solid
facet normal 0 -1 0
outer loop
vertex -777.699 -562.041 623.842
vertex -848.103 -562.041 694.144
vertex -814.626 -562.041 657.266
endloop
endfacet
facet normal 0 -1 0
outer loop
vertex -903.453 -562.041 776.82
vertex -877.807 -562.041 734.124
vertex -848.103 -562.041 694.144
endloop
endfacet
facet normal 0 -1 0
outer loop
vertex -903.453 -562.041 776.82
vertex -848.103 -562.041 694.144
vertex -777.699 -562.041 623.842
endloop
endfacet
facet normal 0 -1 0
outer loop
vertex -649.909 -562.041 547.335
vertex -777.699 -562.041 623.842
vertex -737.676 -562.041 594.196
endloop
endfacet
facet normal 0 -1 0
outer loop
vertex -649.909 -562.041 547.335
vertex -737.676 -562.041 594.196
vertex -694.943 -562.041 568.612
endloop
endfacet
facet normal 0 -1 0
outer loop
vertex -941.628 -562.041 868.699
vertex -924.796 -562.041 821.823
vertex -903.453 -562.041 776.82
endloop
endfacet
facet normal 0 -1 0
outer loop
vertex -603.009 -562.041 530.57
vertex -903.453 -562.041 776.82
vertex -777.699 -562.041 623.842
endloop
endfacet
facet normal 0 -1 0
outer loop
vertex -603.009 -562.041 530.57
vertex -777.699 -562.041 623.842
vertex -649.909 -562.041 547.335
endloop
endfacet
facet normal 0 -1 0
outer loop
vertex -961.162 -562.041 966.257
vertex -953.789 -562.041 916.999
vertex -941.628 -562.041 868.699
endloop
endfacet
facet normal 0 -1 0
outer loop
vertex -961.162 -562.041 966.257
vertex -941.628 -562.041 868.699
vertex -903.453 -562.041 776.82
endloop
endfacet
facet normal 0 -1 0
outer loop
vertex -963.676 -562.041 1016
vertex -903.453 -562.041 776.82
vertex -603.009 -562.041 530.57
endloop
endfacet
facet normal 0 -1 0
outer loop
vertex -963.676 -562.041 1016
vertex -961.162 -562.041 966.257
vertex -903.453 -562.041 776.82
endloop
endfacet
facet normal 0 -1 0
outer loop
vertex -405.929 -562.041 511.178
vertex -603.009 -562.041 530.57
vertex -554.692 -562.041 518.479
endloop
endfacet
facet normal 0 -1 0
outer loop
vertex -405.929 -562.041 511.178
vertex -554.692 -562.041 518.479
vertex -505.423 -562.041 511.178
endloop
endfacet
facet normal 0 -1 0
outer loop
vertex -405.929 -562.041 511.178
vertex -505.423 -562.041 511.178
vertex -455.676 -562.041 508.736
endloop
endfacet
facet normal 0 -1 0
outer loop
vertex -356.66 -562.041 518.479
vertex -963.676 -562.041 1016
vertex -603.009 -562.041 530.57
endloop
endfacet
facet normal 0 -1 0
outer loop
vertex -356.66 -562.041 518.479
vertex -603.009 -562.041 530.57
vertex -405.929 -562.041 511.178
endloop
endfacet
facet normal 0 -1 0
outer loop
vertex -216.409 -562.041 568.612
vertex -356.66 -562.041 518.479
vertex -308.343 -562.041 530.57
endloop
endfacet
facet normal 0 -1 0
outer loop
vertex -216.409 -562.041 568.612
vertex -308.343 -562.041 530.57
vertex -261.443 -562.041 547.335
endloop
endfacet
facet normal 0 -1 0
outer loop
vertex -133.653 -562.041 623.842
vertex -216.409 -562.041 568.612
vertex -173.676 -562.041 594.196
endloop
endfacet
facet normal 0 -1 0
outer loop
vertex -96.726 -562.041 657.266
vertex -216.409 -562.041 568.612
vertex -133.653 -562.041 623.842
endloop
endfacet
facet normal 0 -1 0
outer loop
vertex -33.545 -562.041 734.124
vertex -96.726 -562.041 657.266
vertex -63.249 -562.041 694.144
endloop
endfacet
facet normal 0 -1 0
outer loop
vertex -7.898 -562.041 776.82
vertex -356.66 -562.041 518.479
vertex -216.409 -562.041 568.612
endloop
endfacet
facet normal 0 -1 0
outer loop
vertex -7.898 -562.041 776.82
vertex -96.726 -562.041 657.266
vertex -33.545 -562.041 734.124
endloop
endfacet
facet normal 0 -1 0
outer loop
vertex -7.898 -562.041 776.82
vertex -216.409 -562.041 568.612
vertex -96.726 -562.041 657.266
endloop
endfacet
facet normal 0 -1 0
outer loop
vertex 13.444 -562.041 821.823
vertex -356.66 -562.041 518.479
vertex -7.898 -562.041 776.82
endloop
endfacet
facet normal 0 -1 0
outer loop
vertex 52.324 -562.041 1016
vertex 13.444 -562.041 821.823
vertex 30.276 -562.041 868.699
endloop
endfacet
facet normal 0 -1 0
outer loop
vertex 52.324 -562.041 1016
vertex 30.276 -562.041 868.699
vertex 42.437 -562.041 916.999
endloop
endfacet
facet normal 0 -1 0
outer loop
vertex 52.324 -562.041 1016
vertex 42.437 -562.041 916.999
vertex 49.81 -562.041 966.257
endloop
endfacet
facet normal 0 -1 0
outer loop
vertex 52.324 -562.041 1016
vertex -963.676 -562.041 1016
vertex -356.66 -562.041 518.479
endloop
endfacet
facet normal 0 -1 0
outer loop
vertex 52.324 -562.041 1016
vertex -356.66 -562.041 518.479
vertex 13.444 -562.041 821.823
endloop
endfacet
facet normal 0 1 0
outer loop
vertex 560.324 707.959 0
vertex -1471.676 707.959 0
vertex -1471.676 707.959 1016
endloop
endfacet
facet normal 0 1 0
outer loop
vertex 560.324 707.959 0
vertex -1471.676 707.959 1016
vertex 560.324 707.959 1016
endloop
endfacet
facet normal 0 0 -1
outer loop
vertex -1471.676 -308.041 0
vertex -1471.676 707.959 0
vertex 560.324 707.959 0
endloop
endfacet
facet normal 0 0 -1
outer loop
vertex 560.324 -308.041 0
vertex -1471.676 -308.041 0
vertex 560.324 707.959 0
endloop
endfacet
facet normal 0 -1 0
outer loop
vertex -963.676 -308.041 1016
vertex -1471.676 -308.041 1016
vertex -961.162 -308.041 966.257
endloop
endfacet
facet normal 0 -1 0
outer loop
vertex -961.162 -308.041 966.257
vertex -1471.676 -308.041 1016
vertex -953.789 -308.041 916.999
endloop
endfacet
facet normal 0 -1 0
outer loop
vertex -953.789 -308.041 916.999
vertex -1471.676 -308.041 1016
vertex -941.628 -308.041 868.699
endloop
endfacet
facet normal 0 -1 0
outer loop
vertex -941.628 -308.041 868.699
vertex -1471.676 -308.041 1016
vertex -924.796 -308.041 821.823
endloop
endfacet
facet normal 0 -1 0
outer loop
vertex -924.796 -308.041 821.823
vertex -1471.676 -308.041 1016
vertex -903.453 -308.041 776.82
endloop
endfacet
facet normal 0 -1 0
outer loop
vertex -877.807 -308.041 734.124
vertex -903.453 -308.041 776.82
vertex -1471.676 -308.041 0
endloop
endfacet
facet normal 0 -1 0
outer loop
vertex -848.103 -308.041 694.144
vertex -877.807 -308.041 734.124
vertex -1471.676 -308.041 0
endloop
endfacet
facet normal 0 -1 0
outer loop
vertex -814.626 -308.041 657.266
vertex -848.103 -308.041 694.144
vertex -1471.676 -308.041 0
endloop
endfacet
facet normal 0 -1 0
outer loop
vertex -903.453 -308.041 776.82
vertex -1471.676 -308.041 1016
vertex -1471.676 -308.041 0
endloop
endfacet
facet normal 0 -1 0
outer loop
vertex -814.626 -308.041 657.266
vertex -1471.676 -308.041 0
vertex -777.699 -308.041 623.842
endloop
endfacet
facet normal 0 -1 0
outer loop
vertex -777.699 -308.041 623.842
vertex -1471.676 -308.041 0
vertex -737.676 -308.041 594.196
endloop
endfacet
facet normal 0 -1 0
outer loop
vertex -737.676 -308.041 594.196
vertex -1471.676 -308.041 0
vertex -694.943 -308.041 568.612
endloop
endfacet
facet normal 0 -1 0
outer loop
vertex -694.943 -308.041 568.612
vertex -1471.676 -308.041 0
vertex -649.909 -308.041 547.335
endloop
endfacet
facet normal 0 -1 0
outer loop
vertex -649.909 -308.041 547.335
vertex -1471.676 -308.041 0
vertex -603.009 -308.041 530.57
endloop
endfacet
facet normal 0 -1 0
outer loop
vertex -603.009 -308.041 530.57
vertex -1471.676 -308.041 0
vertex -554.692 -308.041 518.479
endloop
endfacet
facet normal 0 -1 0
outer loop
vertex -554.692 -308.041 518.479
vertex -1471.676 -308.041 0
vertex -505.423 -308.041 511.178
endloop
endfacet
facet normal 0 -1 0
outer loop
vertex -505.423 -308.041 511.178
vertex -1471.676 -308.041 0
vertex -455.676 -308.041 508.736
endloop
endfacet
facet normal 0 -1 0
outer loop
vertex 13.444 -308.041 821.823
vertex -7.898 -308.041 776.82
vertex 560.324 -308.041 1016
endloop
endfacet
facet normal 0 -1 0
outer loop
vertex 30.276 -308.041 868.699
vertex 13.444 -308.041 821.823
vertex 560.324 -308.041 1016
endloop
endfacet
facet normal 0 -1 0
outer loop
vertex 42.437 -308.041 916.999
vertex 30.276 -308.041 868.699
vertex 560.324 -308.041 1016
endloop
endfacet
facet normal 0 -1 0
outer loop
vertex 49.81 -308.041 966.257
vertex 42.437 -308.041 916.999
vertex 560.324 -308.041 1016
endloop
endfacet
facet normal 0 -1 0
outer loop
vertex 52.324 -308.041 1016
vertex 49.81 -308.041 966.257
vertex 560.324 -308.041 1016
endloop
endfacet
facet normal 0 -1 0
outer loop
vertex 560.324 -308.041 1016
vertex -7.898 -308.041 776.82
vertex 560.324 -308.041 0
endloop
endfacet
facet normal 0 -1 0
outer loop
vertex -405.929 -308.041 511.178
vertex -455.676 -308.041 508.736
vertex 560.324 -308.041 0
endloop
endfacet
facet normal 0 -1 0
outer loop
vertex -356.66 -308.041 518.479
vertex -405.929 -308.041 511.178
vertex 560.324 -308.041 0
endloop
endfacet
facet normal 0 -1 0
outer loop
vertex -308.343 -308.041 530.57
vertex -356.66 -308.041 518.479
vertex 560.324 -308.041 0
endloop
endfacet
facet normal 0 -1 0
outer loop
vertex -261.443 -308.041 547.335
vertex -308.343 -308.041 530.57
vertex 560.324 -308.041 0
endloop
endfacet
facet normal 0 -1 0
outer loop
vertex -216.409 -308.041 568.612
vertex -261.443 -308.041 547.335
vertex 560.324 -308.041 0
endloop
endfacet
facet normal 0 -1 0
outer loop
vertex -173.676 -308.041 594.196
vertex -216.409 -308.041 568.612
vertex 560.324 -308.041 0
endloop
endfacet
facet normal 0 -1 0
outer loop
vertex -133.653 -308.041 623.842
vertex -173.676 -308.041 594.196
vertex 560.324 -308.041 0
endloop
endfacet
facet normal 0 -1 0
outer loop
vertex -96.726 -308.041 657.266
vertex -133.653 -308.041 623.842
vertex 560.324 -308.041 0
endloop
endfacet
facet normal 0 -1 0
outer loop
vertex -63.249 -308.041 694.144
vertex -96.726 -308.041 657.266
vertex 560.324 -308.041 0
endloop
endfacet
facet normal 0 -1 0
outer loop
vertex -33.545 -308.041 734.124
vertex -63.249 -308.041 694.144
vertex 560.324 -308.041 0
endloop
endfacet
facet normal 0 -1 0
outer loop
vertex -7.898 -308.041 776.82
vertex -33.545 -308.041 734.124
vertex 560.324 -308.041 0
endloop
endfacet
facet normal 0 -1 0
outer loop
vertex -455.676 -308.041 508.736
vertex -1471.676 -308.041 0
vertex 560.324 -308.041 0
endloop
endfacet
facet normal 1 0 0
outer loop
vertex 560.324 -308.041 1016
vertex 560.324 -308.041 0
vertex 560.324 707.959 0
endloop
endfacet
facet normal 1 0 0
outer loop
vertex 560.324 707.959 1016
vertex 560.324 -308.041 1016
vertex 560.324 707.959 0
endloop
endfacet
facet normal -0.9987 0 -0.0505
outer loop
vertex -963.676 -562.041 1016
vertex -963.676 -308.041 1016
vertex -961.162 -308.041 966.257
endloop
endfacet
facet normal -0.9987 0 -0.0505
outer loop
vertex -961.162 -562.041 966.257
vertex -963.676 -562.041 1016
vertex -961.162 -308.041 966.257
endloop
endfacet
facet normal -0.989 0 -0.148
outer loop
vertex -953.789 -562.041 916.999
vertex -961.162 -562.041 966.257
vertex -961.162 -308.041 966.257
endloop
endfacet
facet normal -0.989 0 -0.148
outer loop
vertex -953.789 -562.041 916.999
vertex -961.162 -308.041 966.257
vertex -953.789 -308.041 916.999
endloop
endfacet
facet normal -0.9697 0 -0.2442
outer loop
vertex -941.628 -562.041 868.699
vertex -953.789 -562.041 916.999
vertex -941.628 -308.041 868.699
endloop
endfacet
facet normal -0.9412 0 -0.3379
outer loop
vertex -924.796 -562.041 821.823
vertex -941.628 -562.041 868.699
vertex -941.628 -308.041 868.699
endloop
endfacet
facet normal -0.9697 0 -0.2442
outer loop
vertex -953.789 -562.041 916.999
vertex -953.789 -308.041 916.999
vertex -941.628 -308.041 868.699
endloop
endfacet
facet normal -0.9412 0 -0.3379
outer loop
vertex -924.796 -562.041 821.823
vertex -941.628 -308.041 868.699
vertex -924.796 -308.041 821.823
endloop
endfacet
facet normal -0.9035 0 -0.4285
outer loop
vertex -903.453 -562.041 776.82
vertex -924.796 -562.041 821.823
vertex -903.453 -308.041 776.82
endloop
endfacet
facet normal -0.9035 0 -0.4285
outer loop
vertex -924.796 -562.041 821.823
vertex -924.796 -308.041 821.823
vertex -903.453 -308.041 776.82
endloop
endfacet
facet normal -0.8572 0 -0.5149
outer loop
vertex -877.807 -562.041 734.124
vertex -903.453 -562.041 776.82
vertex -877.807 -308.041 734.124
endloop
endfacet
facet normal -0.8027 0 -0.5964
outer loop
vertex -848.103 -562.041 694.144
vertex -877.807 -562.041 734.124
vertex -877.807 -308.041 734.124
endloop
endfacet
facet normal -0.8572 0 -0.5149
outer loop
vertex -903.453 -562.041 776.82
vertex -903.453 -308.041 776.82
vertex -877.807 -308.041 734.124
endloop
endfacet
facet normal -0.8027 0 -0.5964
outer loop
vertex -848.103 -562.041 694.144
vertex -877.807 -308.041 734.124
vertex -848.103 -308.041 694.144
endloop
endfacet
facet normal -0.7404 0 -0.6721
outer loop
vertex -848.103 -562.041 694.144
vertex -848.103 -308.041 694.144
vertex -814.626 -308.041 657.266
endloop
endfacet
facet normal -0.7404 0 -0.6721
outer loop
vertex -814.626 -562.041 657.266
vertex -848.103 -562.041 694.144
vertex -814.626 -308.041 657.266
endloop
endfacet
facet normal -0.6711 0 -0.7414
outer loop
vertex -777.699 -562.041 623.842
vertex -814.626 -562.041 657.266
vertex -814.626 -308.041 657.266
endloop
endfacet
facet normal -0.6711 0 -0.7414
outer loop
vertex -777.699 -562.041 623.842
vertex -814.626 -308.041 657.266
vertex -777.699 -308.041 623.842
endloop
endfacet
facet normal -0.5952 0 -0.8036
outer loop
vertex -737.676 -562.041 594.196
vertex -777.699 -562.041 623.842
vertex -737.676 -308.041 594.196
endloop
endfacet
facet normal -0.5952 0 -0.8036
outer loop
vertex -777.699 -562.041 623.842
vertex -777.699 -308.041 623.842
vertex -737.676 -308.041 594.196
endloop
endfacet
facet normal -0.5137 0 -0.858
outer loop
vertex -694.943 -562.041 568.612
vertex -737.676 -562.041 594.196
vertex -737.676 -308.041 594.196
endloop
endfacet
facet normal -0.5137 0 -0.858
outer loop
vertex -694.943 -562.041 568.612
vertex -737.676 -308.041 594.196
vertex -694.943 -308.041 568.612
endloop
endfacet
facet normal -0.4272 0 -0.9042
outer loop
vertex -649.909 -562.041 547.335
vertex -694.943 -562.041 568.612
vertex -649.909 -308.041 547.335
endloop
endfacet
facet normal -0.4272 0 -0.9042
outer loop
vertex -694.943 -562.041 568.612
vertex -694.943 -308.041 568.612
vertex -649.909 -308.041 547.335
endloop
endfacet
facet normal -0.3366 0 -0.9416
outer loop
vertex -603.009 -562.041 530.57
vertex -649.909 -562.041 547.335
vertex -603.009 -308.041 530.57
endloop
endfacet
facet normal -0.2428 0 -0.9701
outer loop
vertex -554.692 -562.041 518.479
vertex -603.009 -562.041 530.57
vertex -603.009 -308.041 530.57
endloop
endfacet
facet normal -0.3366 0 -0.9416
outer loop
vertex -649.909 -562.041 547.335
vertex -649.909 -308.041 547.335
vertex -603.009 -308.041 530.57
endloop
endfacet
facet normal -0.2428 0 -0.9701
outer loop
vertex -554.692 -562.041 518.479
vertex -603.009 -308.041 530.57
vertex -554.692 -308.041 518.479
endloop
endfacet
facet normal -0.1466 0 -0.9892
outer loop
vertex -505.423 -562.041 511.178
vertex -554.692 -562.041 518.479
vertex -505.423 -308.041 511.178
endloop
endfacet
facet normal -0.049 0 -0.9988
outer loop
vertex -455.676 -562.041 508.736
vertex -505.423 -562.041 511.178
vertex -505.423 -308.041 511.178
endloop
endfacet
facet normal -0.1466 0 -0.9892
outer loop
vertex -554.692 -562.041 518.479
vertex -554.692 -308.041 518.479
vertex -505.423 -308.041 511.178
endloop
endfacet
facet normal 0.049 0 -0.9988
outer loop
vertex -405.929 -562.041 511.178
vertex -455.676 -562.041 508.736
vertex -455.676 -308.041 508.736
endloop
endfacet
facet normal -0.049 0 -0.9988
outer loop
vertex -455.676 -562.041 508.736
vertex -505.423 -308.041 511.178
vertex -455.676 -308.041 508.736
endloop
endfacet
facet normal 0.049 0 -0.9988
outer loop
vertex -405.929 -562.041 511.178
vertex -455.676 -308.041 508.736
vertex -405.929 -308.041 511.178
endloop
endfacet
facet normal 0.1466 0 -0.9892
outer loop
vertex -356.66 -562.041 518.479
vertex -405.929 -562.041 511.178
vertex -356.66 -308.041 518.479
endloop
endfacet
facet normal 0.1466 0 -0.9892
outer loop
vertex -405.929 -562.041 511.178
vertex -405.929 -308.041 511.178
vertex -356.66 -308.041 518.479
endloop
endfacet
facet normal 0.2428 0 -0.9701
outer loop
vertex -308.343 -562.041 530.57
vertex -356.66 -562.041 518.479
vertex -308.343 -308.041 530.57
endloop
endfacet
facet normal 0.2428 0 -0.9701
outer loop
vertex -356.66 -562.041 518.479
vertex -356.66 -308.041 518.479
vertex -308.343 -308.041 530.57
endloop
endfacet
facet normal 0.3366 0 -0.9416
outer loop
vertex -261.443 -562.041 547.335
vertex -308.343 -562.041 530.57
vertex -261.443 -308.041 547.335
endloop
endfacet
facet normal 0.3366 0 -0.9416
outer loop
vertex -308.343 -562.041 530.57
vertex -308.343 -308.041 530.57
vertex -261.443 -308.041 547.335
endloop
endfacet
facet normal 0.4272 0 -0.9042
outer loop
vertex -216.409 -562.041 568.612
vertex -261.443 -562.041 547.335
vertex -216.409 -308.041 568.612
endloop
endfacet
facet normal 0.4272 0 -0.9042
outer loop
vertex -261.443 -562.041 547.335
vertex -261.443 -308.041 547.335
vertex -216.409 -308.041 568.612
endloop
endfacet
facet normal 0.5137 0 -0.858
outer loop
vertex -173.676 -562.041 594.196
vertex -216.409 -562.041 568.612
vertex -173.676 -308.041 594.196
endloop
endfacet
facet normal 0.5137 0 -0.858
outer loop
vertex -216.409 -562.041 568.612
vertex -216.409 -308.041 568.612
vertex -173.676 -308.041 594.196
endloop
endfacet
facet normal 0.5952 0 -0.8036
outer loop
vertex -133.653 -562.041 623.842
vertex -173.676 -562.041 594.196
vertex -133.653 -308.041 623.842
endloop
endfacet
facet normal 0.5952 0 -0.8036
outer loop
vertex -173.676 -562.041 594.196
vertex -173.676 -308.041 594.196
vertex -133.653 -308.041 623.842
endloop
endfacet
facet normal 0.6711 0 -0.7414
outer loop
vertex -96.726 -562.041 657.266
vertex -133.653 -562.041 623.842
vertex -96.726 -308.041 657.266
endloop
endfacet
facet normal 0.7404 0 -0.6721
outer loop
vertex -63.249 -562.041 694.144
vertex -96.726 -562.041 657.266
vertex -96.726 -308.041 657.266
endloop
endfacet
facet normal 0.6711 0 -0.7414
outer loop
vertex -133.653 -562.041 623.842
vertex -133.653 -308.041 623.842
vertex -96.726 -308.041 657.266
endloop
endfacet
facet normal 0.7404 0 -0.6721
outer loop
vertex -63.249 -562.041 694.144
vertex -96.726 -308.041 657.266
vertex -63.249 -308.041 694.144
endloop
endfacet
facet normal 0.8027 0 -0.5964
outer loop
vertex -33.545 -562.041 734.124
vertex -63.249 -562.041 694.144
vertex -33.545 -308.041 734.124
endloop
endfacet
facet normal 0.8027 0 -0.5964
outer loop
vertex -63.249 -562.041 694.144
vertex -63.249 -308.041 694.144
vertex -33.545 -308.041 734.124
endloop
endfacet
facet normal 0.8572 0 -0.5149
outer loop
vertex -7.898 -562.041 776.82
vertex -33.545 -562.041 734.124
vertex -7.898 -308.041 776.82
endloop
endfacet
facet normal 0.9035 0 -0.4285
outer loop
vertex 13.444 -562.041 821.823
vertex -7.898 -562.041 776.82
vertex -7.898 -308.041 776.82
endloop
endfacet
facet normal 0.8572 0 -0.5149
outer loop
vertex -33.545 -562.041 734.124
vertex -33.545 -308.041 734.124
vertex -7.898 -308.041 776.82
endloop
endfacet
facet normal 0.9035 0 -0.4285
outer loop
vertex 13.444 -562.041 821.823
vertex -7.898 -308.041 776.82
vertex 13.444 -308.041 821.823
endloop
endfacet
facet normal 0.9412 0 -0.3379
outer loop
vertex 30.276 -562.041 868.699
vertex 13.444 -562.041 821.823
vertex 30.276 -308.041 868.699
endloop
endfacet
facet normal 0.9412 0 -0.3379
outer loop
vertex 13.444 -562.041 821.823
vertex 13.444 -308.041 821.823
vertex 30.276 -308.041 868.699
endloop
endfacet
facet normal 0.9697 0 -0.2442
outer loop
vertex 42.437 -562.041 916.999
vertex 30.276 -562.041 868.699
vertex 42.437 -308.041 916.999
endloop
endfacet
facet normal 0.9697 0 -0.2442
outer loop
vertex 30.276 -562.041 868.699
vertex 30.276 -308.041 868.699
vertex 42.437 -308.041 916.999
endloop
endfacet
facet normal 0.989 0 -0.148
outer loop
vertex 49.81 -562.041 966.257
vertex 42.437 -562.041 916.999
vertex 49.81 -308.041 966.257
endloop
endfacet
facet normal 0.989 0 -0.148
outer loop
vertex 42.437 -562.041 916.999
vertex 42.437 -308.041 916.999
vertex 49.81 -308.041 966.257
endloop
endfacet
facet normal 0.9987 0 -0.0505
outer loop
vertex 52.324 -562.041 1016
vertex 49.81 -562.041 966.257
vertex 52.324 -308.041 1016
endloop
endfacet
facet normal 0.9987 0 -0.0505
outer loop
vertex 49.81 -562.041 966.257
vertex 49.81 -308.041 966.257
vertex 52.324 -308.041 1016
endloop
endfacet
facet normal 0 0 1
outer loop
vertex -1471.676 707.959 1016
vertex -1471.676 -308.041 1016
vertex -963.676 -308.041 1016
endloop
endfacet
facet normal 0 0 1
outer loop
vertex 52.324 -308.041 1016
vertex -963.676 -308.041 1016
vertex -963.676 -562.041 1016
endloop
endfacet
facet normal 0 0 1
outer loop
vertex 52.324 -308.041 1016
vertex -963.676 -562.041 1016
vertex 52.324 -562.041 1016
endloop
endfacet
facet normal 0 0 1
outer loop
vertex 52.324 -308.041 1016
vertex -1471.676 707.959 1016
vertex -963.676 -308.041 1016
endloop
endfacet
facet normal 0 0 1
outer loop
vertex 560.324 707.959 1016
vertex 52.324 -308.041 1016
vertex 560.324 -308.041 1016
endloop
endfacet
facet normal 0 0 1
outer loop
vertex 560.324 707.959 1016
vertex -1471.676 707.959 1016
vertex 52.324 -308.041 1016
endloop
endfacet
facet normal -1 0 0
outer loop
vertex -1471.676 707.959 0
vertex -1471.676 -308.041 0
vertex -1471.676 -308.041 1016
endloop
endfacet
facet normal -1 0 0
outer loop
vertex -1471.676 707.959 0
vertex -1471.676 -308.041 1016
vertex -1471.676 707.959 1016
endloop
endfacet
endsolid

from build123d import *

# Parameters (mm, degrees)
F0_W     = 2032
F0_H     = 1016
F1_DEPTH = 1016
F3_DEPTH = 254
F5_DEPTH = 1016


with BuildPart() as f1:
    # F0 (on Top) → F1 (new body)
    with BuildSketch(Plane.XY):
        with Locations((-455.675927, 199.958904)):
            Rectangle(F0_W, F0_H)
    extrude(amount=F1_DEPTH)

    # F2 (on face) → F3 (join)
    with BuildSketch(Plane.XZ.offset(308.041096)):
        with BuildLine():
            Line((-709.675927, 1016), (-963.675927, 1016))
            ThreePointArc((-963.675927, 1016), (-455.675927, 508.736016), (52.324073, 1016))
            Line((52.324073, 1016), (-201.675927, 1016))
            ThreePointArc((-201.675927, 1016), (-455.675927, 763.618704), (-709.675927, 1016))
        make_face()
        with BuildLine():
            Line((-201.675927, 1016), (-709.675927, 1016))
            ThreePointArc((-709.675927, 1016), (-455.675927, 763.618704), (-201.675927, 1016))
        make_face()
    extrude(amount=F3_DEPTH)

    # F4 (on face) → F5 (join)
    with BuildSketch(Plane.XZ.offset(562.041096)):
        with BuildLine():
            Line((-201.675927, 1016), (-709.675927, 1016))
            ThreePointArc((-709.675927, 1016), (-455.675927, 763.326984), (-201.675927, 1016))
        make_face()
    extrude(amount=-F5_DEPTH)


solid = f1.part
